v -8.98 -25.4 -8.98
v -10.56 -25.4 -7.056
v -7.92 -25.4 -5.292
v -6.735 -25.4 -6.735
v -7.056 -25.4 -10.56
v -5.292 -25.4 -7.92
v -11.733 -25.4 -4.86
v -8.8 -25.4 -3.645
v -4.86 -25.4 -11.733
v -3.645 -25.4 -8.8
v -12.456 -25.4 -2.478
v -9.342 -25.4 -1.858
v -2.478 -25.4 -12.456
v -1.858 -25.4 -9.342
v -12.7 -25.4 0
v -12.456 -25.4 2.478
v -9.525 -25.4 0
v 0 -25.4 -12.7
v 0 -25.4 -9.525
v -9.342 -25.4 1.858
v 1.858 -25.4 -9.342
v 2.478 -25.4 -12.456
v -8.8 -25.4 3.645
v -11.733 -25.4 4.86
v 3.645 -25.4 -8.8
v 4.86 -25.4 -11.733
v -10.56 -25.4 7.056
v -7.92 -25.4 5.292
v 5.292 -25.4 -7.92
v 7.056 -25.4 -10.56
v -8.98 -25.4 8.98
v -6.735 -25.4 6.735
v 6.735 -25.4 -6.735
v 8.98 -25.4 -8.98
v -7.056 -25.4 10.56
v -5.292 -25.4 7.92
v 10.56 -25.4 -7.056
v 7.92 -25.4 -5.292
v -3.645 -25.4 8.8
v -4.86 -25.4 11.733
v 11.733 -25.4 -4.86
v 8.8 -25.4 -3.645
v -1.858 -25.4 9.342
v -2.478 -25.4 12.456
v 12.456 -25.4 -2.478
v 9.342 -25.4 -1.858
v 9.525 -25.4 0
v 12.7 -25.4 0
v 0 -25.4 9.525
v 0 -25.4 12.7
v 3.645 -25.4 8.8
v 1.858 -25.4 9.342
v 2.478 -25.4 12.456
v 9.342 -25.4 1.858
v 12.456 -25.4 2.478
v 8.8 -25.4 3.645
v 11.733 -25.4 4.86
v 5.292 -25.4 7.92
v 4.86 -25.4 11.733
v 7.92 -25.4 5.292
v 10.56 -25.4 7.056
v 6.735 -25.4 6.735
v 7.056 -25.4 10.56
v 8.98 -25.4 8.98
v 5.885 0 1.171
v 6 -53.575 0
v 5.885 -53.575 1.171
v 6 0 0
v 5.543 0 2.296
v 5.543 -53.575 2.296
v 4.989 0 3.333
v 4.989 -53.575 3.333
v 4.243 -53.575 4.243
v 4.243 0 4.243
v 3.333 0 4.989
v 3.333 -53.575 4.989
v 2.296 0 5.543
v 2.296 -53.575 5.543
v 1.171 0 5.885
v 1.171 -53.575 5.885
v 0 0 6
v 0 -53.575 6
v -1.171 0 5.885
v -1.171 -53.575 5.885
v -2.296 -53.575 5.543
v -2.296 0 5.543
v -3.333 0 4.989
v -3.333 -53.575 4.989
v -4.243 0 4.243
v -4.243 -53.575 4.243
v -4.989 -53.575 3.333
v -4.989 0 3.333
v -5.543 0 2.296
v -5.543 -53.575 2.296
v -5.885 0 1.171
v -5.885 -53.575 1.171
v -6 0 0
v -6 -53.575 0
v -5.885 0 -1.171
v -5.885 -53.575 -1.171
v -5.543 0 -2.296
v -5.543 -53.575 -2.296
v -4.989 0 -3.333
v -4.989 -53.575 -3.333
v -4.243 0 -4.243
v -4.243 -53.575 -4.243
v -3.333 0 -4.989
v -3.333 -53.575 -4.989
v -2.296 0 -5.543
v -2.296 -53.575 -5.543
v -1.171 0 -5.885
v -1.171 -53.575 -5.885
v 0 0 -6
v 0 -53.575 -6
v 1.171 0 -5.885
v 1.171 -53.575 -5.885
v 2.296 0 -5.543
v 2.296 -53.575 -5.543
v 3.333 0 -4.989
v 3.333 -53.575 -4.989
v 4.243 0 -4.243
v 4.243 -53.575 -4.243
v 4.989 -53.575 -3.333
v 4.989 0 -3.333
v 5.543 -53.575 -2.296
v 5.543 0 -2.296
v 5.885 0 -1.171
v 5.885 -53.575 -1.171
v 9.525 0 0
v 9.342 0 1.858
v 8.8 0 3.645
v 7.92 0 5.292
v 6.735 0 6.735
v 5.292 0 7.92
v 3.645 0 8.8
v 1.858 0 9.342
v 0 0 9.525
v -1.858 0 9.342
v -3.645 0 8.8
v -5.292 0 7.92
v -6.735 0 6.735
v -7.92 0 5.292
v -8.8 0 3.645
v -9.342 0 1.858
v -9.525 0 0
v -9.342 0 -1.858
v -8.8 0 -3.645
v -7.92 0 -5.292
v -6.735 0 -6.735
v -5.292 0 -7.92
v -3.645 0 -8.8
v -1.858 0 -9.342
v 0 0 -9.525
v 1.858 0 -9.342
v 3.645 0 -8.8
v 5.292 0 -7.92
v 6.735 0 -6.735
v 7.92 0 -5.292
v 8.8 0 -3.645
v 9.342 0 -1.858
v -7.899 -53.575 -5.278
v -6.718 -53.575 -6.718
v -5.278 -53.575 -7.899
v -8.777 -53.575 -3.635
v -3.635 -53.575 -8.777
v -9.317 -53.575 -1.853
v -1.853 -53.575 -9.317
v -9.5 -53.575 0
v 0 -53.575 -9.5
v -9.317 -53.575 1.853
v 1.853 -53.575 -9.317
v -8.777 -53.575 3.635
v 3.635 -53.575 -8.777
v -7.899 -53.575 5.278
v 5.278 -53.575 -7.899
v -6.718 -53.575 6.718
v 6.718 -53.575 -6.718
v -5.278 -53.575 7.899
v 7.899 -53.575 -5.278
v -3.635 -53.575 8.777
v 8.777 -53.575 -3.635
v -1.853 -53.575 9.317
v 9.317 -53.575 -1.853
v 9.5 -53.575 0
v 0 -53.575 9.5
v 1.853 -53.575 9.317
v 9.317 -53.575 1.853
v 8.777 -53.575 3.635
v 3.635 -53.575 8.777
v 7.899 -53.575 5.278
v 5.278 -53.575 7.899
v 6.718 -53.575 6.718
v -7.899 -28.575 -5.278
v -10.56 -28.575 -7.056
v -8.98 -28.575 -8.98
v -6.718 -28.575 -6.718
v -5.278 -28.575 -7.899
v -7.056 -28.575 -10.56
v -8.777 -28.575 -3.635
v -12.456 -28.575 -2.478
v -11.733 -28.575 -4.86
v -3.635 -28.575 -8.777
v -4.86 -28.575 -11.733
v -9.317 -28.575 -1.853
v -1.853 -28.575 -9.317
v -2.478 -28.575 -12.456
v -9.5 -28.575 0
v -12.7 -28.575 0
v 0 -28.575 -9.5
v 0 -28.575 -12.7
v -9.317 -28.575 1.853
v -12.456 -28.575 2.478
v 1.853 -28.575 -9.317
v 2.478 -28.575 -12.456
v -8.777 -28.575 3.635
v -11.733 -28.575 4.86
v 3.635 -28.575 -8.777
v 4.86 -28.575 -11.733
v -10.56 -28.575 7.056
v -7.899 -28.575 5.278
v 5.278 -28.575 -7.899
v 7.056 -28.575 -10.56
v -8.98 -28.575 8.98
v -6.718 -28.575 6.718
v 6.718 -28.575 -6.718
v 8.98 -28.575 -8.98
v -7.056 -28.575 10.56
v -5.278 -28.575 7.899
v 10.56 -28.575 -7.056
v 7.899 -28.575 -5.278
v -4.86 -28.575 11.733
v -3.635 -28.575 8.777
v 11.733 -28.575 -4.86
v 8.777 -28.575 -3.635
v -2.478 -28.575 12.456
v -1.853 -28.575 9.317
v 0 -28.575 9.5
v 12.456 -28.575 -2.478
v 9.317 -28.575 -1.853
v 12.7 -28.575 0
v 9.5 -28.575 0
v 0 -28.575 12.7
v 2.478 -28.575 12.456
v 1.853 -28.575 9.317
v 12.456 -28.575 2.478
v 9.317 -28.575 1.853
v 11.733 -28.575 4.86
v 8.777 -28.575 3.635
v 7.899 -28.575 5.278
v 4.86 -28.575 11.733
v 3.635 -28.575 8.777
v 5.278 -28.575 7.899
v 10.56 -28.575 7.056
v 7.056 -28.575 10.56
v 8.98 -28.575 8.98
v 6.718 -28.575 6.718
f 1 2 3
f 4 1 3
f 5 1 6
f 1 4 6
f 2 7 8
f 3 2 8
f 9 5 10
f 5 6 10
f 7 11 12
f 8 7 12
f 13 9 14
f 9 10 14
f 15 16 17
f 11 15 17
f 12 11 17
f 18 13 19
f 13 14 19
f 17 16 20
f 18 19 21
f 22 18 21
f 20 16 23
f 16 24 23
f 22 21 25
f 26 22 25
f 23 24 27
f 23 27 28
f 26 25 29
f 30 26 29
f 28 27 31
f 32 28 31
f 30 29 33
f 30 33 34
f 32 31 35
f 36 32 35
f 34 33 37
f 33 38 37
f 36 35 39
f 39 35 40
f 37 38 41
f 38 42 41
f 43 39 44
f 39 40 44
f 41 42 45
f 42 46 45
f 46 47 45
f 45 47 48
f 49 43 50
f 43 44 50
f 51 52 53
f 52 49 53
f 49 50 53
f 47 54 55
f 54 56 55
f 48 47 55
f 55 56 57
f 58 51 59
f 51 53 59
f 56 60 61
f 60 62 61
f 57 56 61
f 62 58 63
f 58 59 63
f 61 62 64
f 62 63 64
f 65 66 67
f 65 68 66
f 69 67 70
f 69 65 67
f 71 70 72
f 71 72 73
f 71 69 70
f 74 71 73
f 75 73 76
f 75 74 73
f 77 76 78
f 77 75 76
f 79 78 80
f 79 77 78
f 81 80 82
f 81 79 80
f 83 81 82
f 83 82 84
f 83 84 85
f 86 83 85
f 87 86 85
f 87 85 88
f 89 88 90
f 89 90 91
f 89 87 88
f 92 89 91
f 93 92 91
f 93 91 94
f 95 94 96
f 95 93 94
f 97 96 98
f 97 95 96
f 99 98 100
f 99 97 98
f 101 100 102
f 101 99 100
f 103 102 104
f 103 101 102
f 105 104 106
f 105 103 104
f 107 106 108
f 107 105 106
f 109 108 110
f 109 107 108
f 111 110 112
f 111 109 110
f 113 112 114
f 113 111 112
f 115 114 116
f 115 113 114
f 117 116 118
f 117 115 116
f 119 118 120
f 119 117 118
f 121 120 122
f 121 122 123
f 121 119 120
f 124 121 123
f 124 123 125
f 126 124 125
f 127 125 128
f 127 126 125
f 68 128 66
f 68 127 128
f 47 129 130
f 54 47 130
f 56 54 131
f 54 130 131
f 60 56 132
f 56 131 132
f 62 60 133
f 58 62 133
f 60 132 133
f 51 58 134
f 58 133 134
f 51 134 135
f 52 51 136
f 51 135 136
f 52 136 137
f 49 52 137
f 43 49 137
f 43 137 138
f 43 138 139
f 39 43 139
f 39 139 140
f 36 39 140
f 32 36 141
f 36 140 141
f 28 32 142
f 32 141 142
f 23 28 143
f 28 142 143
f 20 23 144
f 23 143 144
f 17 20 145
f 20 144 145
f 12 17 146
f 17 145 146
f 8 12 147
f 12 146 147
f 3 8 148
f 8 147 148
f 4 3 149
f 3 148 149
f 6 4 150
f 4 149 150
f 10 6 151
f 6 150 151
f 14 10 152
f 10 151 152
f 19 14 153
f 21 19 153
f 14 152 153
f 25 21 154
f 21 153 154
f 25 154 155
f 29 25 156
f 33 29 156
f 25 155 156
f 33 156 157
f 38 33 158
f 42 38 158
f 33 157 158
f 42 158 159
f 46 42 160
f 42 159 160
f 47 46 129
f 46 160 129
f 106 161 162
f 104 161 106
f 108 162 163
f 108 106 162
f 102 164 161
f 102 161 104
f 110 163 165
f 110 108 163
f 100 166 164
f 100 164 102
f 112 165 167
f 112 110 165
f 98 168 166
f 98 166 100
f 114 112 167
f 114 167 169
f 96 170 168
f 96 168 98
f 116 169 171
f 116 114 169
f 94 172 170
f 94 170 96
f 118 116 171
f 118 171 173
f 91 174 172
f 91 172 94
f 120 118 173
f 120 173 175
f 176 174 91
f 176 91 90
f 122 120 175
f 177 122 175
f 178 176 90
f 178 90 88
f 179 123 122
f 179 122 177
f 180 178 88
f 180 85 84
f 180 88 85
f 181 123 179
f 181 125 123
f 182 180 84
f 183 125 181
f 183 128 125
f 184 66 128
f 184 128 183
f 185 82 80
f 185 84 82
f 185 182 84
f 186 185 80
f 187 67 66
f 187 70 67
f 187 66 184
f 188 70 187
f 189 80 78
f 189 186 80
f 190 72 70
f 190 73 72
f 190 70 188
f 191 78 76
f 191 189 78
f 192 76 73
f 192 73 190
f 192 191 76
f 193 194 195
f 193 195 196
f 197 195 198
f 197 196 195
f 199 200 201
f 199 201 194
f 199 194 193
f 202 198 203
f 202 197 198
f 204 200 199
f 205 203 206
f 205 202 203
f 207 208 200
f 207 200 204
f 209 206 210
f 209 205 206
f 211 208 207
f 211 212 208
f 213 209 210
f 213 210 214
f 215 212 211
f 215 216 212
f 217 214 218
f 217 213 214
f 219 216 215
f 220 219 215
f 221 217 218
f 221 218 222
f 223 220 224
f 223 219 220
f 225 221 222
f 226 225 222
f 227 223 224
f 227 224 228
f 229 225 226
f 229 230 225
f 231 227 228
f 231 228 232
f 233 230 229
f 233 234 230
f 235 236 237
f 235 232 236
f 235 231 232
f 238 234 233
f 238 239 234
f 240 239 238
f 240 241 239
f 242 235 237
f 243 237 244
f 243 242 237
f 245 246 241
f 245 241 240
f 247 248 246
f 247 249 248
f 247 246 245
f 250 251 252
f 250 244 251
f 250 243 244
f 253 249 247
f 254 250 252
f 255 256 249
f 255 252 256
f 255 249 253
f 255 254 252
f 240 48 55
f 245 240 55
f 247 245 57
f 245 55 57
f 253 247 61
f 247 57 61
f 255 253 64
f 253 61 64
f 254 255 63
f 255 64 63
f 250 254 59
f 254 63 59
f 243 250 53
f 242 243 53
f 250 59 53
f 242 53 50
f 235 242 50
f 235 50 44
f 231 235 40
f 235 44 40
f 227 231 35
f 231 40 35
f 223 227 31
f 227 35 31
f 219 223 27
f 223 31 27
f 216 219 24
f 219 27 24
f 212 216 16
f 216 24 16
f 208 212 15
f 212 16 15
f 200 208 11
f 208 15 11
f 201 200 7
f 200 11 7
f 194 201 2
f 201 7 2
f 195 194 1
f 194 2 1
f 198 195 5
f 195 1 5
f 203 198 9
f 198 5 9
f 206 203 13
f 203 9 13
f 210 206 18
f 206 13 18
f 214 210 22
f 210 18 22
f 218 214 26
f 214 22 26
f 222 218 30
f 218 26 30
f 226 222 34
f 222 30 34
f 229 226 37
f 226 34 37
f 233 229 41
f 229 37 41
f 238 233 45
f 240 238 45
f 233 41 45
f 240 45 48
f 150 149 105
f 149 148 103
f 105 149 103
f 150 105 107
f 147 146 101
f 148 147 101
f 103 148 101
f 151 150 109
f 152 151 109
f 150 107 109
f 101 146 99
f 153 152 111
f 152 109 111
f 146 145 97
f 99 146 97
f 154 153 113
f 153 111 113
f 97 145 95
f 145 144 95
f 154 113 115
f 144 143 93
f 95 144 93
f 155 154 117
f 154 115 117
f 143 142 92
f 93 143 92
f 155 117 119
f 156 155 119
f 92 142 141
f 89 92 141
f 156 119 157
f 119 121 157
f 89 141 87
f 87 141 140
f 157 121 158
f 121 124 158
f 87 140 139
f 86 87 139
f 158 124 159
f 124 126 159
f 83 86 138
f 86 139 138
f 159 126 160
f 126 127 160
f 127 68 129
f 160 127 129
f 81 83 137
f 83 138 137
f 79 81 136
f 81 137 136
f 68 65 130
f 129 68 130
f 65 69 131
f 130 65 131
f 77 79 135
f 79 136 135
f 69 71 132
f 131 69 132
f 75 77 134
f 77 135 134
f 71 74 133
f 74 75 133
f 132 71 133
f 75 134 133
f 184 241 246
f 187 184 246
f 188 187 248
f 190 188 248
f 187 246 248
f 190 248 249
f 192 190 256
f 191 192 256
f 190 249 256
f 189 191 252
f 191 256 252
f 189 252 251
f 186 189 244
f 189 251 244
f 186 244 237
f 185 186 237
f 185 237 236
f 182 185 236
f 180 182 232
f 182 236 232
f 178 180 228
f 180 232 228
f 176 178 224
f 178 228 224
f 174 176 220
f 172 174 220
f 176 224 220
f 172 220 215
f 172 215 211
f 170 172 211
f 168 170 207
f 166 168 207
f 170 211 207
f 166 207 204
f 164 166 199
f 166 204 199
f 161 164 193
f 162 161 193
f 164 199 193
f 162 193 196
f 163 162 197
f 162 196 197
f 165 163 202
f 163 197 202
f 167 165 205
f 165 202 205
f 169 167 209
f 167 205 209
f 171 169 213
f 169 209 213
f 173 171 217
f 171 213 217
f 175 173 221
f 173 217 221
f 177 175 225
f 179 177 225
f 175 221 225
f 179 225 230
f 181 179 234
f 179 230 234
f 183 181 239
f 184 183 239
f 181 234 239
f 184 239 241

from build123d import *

# Parameters (mm, degrees)
F0_R     = 9.525
F0_R_2   = 6
F1_DEPTH = 25.4
F2_R     = 12.7
F2_R_2   = 9.525
F2_R_3   = 6
F3_DEPTH = 3.175
F4_R     = 9.5
F4_R_2   = 6
F5_DEPTH = 25


with BuildPart() as f1:
    # F0 (on Front) → F1 (new body)
    with BuildSketch(Plane.XZ):
        Circle(F0_R)
        Circle(F0_R_2, mode=Mode.SUBTRACT)
    extrude(amount=F1_DEPTH)

    # F2 (on face) → F3 (join)
    with BuildSketch(Plane.XZ.offset(25.4)):
        Circle(F2_R)
        Circle(F2_R_2, mode=Mode.SUBTRACT)
        Circle(F2_R_2)
        Circle(F2_R_3, mode=Mode.SUBTRACT)
    extrude(amount=F3_DEPTH)

    # F4 (on face) → F5 (join)
    with BuildSketch(Plane.XZ.offset(28.575)):
        Circle(F4_R)
        Circle(F4_R_2, mode=Mode.SUBTRACT)
    extrude(amount=F5_DEPTH)


solid = f1.part
